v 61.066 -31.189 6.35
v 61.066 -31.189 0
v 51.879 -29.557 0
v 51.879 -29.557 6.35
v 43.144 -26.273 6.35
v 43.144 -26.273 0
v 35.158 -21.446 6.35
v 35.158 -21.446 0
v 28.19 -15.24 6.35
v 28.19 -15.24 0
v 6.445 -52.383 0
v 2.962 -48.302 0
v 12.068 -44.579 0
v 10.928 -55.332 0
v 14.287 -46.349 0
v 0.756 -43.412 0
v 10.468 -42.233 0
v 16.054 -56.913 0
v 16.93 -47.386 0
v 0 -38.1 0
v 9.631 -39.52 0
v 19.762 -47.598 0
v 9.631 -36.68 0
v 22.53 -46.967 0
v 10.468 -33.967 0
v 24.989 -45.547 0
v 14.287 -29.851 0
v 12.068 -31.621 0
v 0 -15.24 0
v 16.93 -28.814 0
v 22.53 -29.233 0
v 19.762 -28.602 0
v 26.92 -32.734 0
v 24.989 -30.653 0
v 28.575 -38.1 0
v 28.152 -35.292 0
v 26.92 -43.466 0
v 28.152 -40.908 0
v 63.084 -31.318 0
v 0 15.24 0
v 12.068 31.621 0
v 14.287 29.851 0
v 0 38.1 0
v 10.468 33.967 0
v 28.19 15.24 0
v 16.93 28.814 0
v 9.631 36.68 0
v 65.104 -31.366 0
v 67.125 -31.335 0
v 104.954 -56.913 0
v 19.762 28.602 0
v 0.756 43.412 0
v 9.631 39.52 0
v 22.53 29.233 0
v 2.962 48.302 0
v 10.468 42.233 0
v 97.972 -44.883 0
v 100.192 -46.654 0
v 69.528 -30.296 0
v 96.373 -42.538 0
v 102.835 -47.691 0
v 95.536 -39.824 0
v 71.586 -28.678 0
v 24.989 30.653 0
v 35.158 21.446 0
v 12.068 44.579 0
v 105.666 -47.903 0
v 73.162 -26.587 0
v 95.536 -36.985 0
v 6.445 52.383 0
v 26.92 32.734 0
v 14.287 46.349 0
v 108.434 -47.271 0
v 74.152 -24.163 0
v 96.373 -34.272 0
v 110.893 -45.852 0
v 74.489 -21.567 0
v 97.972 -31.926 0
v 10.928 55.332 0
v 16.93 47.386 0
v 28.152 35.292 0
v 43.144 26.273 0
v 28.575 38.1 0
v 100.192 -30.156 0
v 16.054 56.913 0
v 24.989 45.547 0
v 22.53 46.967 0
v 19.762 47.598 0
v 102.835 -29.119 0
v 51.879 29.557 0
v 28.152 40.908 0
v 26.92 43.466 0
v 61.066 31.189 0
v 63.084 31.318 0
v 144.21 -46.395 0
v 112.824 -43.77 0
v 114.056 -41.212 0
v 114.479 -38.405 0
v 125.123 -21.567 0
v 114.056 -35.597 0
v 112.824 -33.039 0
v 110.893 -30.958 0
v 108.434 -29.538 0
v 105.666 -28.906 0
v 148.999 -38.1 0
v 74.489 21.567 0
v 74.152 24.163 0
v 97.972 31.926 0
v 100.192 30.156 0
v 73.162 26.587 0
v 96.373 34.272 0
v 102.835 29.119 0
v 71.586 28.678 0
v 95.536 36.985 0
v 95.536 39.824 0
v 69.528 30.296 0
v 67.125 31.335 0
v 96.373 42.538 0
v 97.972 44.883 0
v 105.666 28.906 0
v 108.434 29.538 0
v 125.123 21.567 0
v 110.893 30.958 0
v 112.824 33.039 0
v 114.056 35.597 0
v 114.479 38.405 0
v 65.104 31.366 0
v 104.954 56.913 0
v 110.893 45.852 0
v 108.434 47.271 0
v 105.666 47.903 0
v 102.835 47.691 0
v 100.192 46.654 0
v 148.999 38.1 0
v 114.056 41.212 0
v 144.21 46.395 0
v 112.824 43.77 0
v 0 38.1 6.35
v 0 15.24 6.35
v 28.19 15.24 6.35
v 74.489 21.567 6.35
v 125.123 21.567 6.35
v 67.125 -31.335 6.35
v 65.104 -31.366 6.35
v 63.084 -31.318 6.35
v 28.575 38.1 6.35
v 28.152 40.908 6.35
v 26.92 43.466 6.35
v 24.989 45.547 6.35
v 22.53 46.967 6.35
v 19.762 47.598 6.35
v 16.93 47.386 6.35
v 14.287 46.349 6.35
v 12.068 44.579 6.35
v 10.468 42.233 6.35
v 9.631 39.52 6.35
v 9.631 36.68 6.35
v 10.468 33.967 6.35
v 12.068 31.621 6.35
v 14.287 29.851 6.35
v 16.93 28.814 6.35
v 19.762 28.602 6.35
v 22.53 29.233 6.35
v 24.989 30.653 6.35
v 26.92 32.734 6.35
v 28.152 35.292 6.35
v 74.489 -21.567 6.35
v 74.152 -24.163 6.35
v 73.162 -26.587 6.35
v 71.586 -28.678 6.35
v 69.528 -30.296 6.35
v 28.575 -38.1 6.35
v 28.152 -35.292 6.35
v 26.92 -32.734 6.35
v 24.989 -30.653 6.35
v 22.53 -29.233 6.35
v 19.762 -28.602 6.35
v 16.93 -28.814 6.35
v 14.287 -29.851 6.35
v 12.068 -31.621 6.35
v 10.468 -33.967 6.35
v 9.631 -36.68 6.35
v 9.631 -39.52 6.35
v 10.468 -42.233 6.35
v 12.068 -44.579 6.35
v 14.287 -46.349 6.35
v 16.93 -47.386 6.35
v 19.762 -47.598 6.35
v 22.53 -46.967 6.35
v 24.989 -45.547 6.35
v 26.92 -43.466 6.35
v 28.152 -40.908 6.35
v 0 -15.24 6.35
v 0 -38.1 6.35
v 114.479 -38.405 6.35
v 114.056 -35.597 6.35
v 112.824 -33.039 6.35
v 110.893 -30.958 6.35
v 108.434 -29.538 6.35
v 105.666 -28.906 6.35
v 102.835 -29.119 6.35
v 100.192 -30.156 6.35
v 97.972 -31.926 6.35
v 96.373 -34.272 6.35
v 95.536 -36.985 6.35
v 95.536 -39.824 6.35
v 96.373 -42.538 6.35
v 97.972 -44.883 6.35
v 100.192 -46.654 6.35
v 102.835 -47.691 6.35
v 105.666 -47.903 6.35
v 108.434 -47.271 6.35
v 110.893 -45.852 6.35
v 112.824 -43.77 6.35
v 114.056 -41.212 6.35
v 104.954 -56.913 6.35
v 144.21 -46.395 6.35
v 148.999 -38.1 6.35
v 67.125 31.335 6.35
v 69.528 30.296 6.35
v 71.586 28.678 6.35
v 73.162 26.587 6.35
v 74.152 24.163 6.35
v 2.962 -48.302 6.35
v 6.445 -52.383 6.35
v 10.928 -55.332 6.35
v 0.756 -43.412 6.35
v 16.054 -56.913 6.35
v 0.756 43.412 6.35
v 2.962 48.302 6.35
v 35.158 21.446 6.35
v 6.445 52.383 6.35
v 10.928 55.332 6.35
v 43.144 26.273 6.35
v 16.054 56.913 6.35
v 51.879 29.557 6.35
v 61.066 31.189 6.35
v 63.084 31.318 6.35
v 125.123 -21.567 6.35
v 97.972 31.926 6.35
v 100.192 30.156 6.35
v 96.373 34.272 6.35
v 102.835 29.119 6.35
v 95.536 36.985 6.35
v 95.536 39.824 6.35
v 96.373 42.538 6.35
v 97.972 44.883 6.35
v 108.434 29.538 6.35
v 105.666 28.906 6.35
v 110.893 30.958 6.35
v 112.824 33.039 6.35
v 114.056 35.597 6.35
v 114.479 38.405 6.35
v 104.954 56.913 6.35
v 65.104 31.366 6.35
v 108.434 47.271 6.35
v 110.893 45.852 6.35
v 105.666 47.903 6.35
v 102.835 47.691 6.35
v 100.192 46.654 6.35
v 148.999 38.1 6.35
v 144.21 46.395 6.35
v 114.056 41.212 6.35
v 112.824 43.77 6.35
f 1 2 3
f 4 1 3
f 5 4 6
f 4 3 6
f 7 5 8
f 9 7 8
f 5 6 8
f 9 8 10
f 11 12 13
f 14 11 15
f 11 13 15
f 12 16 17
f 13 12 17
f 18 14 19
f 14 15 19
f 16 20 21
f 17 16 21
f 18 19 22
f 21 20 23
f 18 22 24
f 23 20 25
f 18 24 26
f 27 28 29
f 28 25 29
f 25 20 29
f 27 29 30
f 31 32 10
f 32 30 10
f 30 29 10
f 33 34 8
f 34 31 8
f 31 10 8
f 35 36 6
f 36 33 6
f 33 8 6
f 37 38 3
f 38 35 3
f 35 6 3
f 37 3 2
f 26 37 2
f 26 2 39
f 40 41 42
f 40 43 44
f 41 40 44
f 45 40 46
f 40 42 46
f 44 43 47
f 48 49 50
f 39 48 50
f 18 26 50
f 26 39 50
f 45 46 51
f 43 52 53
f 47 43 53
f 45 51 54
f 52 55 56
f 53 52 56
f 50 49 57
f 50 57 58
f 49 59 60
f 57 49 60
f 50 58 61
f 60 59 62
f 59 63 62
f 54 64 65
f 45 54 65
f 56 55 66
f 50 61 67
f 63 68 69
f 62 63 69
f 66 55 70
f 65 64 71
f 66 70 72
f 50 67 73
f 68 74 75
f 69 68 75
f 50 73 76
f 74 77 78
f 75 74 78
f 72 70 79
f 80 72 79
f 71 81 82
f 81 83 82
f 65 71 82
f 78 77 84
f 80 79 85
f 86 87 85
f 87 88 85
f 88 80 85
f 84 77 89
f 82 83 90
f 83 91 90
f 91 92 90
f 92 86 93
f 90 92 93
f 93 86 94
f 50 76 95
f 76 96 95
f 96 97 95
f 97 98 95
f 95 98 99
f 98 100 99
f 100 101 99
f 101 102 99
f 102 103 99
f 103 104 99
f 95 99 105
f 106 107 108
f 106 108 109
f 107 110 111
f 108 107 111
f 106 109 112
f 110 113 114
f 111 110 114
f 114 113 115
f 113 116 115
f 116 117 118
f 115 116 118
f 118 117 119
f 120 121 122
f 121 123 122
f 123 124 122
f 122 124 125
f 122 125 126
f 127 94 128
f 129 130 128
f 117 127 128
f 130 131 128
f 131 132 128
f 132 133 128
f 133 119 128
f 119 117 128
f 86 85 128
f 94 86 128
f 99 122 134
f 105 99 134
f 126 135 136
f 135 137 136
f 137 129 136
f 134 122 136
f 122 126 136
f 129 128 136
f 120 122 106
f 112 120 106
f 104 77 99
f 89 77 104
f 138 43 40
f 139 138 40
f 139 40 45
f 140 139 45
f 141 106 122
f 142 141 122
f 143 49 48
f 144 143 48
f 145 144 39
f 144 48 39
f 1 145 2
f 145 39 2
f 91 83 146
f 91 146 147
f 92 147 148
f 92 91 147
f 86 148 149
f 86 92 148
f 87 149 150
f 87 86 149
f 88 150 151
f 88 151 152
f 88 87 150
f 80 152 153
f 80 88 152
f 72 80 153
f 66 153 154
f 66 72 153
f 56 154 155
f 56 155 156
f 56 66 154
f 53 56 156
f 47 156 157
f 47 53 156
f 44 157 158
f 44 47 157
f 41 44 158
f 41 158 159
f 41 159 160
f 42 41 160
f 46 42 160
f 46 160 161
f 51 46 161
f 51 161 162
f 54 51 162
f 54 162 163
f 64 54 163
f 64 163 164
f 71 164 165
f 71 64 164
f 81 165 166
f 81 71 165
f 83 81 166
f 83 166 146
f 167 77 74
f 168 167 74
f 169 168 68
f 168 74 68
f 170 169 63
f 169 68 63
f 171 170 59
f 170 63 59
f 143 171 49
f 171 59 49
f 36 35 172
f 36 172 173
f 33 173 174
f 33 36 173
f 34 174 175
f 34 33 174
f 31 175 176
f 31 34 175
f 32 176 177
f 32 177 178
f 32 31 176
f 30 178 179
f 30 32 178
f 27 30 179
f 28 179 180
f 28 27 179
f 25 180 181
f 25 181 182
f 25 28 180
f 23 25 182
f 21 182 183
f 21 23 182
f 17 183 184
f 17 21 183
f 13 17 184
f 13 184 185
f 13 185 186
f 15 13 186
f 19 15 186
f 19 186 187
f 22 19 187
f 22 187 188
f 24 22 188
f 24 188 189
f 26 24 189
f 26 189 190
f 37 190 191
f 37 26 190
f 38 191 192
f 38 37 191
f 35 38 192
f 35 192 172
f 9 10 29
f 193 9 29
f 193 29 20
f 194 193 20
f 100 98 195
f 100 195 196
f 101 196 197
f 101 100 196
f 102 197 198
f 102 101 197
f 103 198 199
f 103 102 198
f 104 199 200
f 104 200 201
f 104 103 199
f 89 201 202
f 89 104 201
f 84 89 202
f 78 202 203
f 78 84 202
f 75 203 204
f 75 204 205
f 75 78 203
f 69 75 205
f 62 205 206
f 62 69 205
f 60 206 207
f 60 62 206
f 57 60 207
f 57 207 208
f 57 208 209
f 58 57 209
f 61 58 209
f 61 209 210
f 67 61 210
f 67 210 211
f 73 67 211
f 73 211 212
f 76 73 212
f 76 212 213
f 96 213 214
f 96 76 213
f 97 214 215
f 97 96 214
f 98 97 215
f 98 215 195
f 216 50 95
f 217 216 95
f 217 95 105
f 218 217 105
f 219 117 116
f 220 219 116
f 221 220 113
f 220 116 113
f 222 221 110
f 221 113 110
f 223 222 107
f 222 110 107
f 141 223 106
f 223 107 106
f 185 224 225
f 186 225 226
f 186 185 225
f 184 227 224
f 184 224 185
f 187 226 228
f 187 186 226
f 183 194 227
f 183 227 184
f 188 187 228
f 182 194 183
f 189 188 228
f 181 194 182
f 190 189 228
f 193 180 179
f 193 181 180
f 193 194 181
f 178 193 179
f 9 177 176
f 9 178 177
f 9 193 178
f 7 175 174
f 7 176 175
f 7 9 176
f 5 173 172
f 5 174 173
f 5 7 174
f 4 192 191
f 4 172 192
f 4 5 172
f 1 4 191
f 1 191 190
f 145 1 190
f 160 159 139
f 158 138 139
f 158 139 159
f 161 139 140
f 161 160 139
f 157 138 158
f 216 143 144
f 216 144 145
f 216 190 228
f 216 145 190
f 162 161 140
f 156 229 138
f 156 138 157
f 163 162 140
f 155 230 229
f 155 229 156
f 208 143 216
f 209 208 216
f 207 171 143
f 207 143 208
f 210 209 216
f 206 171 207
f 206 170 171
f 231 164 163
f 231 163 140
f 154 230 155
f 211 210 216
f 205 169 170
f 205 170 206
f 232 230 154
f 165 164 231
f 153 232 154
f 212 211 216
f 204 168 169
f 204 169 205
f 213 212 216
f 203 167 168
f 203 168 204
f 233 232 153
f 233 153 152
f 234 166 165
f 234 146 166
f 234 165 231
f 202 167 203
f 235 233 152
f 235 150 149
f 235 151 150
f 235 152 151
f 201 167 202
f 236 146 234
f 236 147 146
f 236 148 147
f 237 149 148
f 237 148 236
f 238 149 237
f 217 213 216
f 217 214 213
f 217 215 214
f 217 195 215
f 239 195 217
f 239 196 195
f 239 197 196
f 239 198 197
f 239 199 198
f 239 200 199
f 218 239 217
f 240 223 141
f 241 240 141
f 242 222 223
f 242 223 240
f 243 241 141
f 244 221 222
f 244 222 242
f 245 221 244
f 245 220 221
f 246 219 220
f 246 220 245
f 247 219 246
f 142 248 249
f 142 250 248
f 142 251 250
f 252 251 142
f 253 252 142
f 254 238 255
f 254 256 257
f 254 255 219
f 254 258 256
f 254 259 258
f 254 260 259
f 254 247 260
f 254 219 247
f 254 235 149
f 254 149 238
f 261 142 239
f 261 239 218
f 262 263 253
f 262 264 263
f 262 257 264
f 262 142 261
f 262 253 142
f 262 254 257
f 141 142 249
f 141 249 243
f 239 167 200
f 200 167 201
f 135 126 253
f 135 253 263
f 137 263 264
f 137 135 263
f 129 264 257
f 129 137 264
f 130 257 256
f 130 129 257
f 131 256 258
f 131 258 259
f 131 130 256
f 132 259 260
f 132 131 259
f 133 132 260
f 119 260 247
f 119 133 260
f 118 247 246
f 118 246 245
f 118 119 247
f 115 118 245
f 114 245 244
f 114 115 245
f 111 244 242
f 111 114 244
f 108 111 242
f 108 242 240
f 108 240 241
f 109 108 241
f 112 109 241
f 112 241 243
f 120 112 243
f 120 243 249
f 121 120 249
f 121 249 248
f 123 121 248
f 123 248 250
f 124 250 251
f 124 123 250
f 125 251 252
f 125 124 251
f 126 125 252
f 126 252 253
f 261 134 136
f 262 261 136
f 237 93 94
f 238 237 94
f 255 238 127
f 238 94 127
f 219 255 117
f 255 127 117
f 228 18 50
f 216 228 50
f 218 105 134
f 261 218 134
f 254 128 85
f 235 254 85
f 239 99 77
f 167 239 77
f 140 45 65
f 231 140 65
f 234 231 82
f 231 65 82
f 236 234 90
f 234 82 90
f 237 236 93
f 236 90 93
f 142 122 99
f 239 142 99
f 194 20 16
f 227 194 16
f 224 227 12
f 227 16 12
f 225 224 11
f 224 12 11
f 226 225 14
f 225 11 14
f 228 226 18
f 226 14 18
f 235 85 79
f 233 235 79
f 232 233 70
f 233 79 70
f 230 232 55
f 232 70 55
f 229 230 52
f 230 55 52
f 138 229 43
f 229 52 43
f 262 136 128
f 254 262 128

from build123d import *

# Parameters (mm, degrees)
F0_R     = 9.525
F1_DEPTH = 6.35


with BuildPart() as f1:
    # F0 (on Top) → F1 (new body)
    with BuildSketch(Plane.XY):
        with BuildLine():
            Line((104.954476, 56.91301), (16.054476, 56.91301))
            ThreePointArc((16.054476, 56.91301), (4.559189, 50.466038), (0, 38.1))
            Line((0, 38.1), (0, 15.24))
            Line((0, 15.24), (28.189888, 15.24))
            ThreePointArc((28.189888, 15.24), (43.144494, 26.272727), (61.066383, 31.188743))
            ThreePointArc((61.066383, 31.188743), (64.084666, 31.724007), (67.12522, 31.334683))
            ThreePointArc((67.12522, 31.334683), (72.442024, 27.683294), (74.48932, 21.566953))
            Line((74.48932, 21.566953), (125.122593, 21.566953))
            Line((125.122593, 21.566953), (125.122593, -21.566953))
            Line((125.122593, -21.566953), (74.48932, -21.566953))
            ThreePointArc((74.48932, -21.566953), (72.442024, -27.683294), (67.12522, -31.334683))
            ThreePointArc((67.12522, -31.334683), (64.084666, -31.724007), (61.066383, -31.188743))
            ThreePointArc((61.066383, -31.188743), (43.144494, -26.272727), (28.189888, -15.24))
            Line((28.189888, -15.24), (0, -15.24))
            Line((0, -15.24), (0, -38.1))
            ThreePointArc((0, -38.1), (4.559189, -50.466038), (16.054476, -56.91301))
            Line((16.054476, -56.91301), (104.954476, -56.91301))
            Line((104.954476, -56.91301), (144.209702, -46.394604))
            Line((144.209702, -46.394604), (148.998593, -38.1))
            Line((148.998593, -38.1), (148.998593, 0))
            Line((148.998593, 0), (148.998593, 38.1))
            Line((148.998593, 38.1), (144.209702, 46.394604))
            Line((144.209702, 46.394604), (104.954476, 56.91301))
        make_face()
        with Locations((19.05, -38.1)):
            Circle(F0_R, mode=Mode.SUBTRACT)
        with Locations((104.954476, -38.4048)):
            Circle(F0_R, mode=Mode.SUBTRACT)
        with Locations((19.05, 38.1)):
            Circle(F0_R, mode=Mode.SUBTRACT)
        with Locations((104.954476, 38.4048)):
            Circle(F0_R, mode=Mode.SUBTRACT)
        with BuildLine():
            ThreePointArc((67.12522, 31.334683), (64.084666, 31.724007), (61.066383, 31.188743))
            ThreePointArc((61.066383, 31.188743), (64.093623, 31.352148), (67.12522, 31.334683))
        make_face()
        with BuildLine():
            ThreePointArc((61.066383, -31.188743), (64.084666, -31.724007), (67.12522, -31.334683))
            ThreePointArc((67.12522, -31.334683), (64.093623, -31.352148), (61.066383, -31.188743))
        make_face()
    extrude(amount=F1_DEPTH)


solid = f1.part
